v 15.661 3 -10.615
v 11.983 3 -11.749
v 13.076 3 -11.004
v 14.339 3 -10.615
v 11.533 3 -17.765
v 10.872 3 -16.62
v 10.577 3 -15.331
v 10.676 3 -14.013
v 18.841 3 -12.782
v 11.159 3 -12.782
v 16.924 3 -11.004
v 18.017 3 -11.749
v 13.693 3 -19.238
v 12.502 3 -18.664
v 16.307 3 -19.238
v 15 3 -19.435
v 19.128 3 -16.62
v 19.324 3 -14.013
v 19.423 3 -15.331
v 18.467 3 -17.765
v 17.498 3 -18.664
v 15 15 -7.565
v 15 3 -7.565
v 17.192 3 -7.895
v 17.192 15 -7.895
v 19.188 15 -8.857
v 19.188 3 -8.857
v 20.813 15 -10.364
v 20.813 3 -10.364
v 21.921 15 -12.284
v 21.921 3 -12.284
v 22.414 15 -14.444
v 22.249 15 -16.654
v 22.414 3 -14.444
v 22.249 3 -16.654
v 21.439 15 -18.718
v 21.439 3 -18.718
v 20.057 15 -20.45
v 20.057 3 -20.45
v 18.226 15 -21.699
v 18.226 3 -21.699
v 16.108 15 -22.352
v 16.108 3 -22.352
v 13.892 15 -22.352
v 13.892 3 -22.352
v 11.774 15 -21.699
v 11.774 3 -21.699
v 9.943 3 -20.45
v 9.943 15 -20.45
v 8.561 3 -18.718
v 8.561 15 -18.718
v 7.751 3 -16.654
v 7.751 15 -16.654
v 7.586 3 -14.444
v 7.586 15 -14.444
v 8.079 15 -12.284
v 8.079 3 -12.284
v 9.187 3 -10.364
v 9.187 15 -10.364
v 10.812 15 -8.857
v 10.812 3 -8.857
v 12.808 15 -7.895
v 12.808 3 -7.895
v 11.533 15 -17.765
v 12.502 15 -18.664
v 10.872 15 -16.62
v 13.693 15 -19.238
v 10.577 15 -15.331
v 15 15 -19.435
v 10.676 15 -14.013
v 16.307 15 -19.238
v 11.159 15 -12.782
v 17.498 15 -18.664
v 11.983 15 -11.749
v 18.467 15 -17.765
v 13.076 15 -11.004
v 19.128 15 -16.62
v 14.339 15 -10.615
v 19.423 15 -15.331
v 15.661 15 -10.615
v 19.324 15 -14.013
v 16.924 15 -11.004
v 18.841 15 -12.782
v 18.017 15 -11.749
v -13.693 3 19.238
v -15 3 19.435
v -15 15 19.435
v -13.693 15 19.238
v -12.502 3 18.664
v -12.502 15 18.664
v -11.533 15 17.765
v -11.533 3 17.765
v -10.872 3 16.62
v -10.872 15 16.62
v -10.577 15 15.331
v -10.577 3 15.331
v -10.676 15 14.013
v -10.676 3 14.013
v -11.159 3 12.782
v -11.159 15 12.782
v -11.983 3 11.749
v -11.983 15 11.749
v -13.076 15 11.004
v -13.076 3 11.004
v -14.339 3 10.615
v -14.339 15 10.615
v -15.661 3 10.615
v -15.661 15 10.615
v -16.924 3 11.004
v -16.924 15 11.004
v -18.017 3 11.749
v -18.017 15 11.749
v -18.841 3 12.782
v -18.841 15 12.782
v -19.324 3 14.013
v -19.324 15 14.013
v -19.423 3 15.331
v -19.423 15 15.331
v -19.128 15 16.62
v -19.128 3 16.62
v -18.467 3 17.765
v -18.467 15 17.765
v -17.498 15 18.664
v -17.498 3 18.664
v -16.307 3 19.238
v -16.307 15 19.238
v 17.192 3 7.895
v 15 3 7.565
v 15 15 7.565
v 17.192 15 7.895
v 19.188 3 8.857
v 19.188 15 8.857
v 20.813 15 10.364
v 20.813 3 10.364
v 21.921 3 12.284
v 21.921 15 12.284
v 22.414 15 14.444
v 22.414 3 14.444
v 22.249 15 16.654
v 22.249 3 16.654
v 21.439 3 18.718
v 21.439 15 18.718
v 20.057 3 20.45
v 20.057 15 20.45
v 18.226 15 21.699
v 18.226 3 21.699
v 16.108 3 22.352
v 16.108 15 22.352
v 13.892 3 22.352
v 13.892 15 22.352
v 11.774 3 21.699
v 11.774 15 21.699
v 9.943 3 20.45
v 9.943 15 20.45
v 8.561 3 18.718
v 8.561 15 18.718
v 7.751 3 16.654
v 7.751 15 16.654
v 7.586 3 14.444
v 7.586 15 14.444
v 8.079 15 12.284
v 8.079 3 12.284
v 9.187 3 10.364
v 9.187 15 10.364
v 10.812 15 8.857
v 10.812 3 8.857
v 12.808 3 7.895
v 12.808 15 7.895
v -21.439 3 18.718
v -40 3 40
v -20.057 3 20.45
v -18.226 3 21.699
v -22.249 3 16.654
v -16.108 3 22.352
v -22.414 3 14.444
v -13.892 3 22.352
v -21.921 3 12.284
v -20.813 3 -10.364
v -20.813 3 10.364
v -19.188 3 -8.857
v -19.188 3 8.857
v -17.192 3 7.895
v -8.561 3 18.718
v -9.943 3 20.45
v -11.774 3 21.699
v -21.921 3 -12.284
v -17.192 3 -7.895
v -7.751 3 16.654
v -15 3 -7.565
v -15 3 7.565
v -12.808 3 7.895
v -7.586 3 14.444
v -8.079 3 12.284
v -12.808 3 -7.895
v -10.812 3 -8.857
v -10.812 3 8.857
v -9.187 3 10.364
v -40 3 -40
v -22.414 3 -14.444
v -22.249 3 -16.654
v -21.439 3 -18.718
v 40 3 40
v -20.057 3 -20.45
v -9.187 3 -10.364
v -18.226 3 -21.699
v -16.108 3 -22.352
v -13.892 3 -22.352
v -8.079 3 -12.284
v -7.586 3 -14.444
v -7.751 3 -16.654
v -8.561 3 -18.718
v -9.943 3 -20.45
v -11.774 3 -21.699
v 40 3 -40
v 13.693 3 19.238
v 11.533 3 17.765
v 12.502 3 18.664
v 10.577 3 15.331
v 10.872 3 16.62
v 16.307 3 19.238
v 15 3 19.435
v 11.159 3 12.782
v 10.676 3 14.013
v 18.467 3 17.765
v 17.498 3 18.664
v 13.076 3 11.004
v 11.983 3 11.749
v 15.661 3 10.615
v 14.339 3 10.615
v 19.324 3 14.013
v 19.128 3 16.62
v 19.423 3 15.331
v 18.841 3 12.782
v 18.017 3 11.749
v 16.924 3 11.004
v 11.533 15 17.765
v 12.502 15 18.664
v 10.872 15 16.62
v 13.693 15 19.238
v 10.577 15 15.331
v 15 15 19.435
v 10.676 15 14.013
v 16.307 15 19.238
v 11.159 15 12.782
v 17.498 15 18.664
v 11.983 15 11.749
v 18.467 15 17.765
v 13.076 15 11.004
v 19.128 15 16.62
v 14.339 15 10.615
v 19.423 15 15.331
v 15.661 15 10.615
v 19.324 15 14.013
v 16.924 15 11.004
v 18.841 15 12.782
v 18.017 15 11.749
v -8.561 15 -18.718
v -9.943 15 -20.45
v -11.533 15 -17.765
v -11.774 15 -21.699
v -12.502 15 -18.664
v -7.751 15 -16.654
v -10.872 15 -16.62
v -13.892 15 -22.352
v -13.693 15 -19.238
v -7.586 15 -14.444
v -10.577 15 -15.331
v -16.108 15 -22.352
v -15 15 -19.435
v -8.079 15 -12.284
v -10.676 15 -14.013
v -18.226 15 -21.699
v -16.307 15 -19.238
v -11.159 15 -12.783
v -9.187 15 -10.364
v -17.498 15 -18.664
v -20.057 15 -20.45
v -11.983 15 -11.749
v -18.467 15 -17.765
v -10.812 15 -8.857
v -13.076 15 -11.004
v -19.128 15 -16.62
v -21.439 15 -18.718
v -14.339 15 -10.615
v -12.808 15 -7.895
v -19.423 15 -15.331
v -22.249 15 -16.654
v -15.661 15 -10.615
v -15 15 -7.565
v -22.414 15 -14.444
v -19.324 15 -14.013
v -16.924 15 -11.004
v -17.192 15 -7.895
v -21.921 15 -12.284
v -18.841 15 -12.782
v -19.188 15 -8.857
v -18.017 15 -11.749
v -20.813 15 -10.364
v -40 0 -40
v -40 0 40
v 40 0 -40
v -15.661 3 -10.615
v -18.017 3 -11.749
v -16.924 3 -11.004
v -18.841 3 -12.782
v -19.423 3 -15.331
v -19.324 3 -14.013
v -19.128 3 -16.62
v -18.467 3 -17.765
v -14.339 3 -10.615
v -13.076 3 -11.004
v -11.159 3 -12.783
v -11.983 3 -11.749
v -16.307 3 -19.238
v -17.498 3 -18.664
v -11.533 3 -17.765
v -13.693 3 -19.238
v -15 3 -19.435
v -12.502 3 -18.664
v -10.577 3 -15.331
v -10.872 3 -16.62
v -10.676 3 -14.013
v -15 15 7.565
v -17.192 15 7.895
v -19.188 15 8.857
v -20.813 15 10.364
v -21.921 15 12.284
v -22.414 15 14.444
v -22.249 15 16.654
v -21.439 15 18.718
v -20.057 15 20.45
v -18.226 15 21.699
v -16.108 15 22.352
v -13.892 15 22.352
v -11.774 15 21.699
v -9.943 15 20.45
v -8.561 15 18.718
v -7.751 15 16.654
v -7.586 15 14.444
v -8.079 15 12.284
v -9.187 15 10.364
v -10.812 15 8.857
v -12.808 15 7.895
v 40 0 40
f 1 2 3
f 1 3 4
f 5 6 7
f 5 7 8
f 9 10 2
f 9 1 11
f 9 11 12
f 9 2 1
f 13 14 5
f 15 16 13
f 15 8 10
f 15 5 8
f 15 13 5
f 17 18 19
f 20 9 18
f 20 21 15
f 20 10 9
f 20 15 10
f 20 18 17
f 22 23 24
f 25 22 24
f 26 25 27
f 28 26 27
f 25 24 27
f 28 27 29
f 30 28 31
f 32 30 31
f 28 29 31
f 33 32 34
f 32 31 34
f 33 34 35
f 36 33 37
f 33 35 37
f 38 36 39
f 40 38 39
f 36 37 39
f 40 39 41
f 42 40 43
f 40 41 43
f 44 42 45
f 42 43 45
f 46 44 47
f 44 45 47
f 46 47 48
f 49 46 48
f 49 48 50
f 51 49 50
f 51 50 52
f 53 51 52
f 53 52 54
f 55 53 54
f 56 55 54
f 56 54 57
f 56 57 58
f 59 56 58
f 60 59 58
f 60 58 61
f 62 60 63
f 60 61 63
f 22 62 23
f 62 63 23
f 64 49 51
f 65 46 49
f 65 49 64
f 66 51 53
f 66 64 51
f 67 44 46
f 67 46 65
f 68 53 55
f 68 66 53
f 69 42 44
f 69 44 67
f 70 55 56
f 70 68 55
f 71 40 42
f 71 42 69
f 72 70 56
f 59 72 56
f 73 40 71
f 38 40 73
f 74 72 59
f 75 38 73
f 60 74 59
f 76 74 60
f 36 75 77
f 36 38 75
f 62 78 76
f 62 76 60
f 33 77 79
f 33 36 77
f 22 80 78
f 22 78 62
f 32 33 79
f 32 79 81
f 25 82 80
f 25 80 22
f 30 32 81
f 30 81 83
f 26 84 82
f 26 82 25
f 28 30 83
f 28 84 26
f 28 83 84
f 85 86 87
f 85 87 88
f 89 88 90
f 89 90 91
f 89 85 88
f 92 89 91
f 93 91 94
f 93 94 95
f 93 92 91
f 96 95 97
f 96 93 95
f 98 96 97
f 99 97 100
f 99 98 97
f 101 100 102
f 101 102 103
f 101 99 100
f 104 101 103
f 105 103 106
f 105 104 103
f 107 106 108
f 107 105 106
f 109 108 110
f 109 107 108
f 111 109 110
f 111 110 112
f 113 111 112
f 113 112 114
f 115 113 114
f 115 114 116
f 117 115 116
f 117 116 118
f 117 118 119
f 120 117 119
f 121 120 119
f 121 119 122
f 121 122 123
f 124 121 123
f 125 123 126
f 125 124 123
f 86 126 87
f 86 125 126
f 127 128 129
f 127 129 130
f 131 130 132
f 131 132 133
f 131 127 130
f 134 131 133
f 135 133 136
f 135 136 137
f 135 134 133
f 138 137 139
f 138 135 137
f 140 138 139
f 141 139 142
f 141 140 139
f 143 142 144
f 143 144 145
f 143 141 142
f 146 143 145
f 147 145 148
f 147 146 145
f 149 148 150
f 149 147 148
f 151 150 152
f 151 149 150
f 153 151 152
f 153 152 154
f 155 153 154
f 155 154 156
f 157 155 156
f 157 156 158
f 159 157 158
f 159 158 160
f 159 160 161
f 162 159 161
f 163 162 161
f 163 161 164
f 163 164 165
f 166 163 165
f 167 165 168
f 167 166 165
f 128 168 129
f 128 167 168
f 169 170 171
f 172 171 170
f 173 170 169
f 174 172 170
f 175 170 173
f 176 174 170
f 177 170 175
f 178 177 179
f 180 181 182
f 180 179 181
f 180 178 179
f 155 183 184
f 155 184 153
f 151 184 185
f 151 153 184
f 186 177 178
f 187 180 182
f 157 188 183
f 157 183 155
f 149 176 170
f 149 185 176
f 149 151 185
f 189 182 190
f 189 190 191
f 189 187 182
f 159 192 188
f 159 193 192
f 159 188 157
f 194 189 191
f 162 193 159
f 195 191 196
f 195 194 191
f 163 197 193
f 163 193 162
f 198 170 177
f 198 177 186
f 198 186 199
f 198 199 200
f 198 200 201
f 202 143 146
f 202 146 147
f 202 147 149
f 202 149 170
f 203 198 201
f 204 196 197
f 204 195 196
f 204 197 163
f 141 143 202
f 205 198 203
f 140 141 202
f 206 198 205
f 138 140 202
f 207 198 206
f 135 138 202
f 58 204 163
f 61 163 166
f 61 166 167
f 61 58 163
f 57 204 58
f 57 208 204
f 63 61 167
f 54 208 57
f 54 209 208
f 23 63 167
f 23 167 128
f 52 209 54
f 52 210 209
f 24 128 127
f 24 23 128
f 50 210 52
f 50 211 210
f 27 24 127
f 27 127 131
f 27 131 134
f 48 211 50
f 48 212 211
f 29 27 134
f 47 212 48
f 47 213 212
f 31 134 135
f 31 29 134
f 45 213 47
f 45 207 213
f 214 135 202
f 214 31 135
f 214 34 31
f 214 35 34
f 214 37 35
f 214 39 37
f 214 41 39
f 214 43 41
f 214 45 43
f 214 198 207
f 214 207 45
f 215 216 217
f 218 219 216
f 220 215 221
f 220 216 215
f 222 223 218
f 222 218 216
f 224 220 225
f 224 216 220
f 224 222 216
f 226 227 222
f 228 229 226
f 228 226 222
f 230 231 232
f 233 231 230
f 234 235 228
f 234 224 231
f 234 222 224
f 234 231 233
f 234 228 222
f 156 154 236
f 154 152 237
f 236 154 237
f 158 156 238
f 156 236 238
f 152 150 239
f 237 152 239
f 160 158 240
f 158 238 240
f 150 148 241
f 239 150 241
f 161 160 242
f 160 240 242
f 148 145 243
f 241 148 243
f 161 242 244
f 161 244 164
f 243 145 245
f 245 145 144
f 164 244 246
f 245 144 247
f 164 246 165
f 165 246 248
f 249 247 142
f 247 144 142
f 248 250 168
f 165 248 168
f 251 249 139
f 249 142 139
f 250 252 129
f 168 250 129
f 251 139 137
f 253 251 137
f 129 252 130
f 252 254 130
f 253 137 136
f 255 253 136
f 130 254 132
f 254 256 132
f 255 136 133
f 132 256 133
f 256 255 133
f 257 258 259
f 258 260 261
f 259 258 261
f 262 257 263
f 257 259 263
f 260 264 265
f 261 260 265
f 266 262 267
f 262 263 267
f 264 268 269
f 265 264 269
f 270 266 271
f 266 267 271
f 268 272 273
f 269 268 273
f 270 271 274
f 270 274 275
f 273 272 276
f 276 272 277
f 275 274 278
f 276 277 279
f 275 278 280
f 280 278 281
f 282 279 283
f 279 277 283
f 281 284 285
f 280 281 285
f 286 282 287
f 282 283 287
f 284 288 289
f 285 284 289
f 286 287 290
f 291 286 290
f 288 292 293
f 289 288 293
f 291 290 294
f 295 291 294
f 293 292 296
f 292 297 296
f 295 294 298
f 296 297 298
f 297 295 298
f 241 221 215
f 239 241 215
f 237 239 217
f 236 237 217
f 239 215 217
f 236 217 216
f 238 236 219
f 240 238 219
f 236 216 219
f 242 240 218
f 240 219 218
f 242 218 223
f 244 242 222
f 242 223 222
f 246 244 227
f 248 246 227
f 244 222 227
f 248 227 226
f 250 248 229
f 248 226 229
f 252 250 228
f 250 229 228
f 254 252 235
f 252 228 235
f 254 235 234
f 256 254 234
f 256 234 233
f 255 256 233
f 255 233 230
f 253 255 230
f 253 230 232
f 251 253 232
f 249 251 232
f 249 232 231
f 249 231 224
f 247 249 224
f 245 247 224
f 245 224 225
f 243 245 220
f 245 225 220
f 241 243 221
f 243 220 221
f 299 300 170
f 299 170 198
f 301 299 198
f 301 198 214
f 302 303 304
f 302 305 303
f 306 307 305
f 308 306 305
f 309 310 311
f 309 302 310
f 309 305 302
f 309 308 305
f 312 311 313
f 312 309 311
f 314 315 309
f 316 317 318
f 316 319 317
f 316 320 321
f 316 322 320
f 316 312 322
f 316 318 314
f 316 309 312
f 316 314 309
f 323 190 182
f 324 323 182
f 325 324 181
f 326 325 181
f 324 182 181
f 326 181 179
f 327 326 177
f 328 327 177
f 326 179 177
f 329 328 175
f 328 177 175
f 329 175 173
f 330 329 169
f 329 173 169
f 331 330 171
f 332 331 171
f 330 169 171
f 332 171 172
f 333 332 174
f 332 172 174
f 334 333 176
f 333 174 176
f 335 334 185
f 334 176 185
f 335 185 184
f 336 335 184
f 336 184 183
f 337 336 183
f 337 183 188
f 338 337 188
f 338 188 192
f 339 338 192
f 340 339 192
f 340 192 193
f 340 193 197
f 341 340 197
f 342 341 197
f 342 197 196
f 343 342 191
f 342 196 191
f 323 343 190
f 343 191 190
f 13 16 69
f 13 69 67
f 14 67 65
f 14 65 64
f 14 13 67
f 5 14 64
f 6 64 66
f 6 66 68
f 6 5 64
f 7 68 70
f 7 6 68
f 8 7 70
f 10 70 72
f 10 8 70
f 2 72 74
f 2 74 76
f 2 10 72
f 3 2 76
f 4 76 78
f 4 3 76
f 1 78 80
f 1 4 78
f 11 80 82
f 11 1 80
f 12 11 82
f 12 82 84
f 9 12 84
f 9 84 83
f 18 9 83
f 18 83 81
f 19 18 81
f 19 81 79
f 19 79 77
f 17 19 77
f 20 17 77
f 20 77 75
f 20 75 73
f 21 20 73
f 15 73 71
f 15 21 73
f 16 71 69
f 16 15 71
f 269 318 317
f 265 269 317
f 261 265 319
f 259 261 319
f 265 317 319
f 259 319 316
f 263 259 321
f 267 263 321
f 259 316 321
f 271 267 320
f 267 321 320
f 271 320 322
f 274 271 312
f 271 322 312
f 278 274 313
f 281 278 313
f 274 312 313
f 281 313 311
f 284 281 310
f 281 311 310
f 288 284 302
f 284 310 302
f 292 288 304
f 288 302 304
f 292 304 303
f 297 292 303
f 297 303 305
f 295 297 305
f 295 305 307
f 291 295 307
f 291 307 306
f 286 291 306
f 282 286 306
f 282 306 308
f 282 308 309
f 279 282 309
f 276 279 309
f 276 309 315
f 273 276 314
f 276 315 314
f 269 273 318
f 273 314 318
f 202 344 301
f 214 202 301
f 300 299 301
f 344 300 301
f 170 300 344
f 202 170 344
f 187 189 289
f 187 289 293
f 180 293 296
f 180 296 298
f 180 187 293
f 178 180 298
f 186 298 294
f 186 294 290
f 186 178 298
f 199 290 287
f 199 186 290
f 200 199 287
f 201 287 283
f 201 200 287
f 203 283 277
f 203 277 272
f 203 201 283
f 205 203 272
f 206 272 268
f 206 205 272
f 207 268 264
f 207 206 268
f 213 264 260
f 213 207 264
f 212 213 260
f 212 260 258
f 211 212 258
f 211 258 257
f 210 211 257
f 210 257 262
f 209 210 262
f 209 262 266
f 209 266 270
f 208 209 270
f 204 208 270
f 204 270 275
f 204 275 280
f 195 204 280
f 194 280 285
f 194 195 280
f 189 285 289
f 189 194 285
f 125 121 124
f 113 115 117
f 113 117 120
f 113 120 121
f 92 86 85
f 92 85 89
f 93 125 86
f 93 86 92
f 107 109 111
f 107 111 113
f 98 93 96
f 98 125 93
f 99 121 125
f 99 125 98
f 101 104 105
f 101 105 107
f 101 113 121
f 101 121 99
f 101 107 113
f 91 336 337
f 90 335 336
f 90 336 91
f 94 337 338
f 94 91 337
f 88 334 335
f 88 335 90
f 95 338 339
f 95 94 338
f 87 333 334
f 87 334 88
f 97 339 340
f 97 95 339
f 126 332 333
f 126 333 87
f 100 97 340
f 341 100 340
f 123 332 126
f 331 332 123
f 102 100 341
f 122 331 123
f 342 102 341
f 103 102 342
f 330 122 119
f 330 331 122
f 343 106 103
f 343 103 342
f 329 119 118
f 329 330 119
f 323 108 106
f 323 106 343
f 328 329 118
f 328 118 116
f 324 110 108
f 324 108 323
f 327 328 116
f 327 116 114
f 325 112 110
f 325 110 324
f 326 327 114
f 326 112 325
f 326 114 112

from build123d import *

# Parameters (mm, degrees)
SKETCH1_W                 = 80
SKETCH1_H                 = 80
BOSS_EXTRUDE1_DEPTH       = 3
SKETCH2_R                 = 7.435
SKETCH2_R_2               = 4.435
BOSS_EXTRUDE2_DEPTH       = 12
MIRROR2_COPY_1_SKETCH_R   = 7.435
MIRROR2_COPY_1_SKETCH_R_2 = 4.435
MIRROR2_COPY_1_DEPTH      = 12


with BuildPart() as part:
    # Sketch1 → Boss-Extrude1 (new body)
    with BuildSketch(Plane(origin=(0, 0, 0), x_dir=(1, 0, 0), z_dir=(0, 1, 0))):
        Rectangle(SKETCH1_W, SKETCH1_H)
    extrude(amount=BOSS_EXTRUDE1_DEPTH)

    # Sketch2 → Boss-Extrude2 (add)
    with BuildSketch(Plane(origin=(0, 3, 0), x_dir=(1, 0, 0), z_dir=(0, 1, 0))):
        with Locations(Location((-15, -15, 0), (0, 0, 90))):  # turned: the seam where the file's is
            Circle(SKETCH2_R)
        with Locations(Location((-15, -15, 0), (0, 0, 270))):  # turned: the seam where the file's is
            Circle(SKETCH2_R_2, mode=Mode.SUBTRACT)
    boss_extrude2 = extrude(amount=BOSS_EXTRUDE2_DEPTH)

    # Mirror1: Boss-Extrude2 across plane
    add(boss_extrude2.mirror(Plane.XY))

    # Mirror2: Boss-Extrude2 across plane
    add(boss_extrude2.mirror(Plane(origin=(0, 0, 0), x_dir=(0, 0, 1), z_dir=(1, 0, 0))))

    # Mirror2 copy 1 sketch → Mirror2 copy 1 (add)
    with BuildSketch(Plane(origin=(0, 3, 0), x_dir=(-1, 0, 0), z_dir=(0, 1, 0))):
        with Locations(Location((-15, -15, 0), (0, 0, 90))):  # turned: the seam where the file's is
            Circle(MIRROR2_COPY_1_SKETCH_R)
        with Locations(Location((-15, -15, 0), (0, 0, 270))):  # turned: the seam where the file's is
            Circle(MIRROR2_COPY_1_SKETCH_R_2, mode=Mode.SUBTRACT)
    extrude(amount=MIRROR2_COPY_1_DEPTH)


solid = part.part
